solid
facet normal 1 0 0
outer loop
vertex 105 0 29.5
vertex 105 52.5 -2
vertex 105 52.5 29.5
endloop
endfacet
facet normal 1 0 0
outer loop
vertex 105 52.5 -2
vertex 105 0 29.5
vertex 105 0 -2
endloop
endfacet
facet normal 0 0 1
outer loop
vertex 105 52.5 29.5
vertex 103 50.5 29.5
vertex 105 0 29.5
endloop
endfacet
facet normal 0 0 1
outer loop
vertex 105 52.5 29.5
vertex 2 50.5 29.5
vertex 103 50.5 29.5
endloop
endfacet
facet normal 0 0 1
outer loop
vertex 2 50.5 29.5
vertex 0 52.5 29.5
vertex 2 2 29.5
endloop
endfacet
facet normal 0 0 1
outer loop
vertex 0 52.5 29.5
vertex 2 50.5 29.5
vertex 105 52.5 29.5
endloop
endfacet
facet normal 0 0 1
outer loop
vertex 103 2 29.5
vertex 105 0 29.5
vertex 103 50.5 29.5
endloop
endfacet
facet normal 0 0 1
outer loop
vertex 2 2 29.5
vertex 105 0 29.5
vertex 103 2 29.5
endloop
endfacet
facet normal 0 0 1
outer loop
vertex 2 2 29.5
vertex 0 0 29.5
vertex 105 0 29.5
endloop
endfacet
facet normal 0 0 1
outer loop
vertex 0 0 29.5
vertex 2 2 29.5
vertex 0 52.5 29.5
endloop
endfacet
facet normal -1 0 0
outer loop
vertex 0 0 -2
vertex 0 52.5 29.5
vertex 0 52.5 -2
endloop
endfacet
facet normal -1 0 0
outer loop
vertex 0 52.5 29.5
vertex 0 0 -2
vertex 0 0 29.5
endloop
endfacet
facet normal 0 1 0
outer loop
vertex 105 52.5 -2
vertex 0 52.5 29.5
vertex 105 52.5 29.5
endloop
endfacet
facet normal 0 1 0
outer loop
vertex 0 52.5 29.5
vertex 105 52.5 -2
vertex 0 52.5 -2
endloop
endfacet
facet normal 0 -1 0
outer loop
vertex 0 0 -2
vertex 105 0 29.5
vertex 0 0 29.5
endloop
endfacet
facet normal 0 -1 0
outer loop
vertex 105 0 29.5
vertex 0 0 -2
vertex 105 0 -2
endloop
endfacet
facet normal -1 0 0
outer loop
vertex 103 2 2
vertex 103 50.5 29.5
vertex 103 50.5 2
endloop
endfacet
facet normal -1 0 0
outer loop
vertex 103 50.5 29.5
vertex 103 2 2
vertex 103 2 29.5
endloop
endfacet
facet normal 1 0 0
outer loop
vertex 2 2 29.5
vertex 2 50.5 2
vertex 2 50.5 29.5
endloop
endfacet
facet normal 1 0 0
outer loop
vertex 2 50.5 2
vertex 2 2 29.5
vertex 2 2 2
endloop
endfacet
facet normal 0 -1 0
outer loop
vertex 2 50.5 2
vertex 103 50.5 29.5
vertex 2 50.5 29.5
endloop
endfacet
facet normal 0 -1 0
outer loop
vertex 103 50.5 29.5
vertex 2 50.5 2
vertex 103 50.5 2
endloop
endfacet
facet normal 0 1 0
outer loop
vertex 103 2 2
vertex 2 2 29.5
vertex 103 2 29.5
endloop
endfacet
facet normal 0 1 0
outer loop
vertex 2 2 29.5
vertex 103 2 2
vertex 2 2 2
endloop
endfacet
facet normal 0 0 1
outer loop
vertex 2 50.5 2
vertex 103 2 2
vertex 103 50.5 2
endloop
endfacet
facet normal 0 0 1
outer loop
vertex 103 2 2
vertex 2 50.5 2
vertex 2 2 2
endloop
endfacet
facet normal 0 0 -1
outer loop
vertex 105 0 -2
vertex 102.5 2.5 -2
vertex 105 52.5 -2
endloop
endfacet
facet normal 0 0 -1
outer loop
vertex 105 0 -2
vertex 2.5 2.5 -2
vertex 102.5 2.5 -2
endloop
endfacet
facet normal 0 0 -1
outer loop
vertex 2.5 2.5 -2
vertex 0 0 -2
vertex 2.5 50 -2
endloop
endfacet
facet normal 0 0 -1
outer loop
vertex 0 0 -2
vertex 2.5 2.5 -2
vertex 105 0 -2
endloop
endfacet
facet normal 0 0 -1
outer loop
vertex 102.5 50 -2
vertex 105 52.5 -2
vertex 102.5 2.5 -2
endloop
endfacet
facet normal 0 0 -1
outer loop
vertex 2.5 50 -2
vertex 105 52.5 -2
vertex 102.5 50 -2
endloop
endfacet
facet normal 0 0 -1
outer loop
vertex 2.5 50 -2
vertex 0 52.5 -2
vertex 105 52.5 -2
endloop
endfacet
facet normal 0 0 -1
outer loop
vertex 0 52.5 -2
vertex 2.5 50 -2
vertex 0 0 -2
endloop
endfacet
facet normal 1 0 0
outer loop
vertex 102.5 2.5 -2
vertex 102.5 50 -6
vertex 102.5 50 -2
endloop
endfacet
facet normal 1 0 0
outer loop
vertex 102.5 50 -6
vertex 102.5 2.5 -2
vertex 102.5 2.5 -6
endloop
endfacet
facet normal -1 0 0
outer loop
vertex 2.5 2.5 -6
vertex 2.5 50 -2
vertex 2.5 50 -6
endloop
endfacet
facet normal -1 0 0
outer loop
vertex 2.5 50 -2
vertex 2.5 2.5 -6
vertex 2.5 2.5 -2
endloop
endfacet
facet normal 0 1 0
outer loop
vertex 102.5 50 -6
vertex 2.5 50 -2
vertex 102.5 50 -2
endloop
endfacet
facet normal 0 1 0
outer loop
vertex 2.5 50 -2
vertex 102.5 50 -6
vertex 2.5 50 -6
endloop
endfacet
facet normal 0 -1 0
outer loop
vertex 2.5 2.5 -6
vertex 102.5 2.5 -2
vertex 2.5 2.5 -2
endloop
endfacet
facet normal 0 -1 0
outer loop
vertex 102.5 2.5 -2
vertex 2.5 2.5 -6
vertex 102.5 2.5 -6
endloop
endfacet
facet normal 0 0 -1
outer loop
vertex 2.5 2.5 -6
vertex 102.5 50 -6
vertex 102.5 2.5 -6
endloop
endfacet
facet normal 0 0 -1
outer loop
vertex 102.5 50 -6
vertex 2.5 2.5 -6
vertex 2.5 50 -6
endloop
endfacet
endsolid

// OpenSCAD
/*
Stackable boxes
*/
LIP = 2;

/*
Project Box
These are sold at Costco.
*/
ProjectBoxWidth=315;
ProjectBoxHeight = 55;
StackCount = 2;

function actualLip(value) = value * 2;
function stackBoxHeight(height, count, lip) = height/count + (count-1) * lip;
function half(width) = width/2;
function third(width) = width/3;
function quarter(width) = width/4;
function sixth(width) = width/6;

stackableBox(third(ProjectBoxWidth),sixth(ProjectBoxWidth),stackBoxHeight(ProjectBoxHeight,StackCount,LIP));

module stackableBox(width, length, height)
{
    lip = actualLip(LIP);
    tolerance = 1;
    echo(width, length, height, lip);
//    difference()
//    {
    union()
    {
        Box(width,length,height,lip);
        translate([(lip+tolerance)/2,(lip+tolerance)/2,-lip])
        {
            Box(width-lip-tolerance,length-lip-tolerance,lip,lip);
        }
//    }
//    translate([4,5,-3])
//    cube([width-lip*2-tolerance,length-lip*2-tolerance,lip*2],false);
}
}

module Box(width, length, height, wall)
{
    echo(width, length, height, wall);
    b_floor = wall;
    //resize([0,0,0]) 
    translate([width/2,length/2,0]) 
    cube([width, length,b_floor],true); //box floor
    BoxWalls(width,length,height,wall);

}

module BoxWalls(width, length, height, wall)
{
     translate([width/2,length/2,height/2]) 
    difference()
    {
    cube([width, length,height],true);
    cube([width-wall,length-wall,height+wall], true);
    }
}

 module cubeWithTopOverhang(width, length, height)
 {
     lip = actualLip(LIP);
//     echo(width, length, height, lip);
     
     t = [[0,0],[lip,0],[0,lip]];
//     echo(t);
     
     cube([width, length, height]);
     
     translate([0,length,height])
     rotate([180,0,0]) union()
     {
        translate([width/2,0,0])
        rotate([0,-90,0])
        linear_extrude(height = width, center = true, convexity = 10)
        polygon(t);

        translate([width/2,length,0])
        rotate([90,-90,90])
        linear_extrude(height = width, center = true, convexity = 10)
        polygon(t);
             
        translate([0,length/2,0])
        rotate([270,-90,0])
        linear_extrude(height = length, center = true, convexity = 10)
        polygon(t);
             
        translate([width,length/2,0])
        rotate([90,-90,0])
        linear_extrude(height = length, center = true, convexity = 10)
        polygon(t);   
     }
}
//translate([0,0,stackBoxHeight(ProjectBoxHeight,StackCount,LIP)])
//rotate([180,0,0])
